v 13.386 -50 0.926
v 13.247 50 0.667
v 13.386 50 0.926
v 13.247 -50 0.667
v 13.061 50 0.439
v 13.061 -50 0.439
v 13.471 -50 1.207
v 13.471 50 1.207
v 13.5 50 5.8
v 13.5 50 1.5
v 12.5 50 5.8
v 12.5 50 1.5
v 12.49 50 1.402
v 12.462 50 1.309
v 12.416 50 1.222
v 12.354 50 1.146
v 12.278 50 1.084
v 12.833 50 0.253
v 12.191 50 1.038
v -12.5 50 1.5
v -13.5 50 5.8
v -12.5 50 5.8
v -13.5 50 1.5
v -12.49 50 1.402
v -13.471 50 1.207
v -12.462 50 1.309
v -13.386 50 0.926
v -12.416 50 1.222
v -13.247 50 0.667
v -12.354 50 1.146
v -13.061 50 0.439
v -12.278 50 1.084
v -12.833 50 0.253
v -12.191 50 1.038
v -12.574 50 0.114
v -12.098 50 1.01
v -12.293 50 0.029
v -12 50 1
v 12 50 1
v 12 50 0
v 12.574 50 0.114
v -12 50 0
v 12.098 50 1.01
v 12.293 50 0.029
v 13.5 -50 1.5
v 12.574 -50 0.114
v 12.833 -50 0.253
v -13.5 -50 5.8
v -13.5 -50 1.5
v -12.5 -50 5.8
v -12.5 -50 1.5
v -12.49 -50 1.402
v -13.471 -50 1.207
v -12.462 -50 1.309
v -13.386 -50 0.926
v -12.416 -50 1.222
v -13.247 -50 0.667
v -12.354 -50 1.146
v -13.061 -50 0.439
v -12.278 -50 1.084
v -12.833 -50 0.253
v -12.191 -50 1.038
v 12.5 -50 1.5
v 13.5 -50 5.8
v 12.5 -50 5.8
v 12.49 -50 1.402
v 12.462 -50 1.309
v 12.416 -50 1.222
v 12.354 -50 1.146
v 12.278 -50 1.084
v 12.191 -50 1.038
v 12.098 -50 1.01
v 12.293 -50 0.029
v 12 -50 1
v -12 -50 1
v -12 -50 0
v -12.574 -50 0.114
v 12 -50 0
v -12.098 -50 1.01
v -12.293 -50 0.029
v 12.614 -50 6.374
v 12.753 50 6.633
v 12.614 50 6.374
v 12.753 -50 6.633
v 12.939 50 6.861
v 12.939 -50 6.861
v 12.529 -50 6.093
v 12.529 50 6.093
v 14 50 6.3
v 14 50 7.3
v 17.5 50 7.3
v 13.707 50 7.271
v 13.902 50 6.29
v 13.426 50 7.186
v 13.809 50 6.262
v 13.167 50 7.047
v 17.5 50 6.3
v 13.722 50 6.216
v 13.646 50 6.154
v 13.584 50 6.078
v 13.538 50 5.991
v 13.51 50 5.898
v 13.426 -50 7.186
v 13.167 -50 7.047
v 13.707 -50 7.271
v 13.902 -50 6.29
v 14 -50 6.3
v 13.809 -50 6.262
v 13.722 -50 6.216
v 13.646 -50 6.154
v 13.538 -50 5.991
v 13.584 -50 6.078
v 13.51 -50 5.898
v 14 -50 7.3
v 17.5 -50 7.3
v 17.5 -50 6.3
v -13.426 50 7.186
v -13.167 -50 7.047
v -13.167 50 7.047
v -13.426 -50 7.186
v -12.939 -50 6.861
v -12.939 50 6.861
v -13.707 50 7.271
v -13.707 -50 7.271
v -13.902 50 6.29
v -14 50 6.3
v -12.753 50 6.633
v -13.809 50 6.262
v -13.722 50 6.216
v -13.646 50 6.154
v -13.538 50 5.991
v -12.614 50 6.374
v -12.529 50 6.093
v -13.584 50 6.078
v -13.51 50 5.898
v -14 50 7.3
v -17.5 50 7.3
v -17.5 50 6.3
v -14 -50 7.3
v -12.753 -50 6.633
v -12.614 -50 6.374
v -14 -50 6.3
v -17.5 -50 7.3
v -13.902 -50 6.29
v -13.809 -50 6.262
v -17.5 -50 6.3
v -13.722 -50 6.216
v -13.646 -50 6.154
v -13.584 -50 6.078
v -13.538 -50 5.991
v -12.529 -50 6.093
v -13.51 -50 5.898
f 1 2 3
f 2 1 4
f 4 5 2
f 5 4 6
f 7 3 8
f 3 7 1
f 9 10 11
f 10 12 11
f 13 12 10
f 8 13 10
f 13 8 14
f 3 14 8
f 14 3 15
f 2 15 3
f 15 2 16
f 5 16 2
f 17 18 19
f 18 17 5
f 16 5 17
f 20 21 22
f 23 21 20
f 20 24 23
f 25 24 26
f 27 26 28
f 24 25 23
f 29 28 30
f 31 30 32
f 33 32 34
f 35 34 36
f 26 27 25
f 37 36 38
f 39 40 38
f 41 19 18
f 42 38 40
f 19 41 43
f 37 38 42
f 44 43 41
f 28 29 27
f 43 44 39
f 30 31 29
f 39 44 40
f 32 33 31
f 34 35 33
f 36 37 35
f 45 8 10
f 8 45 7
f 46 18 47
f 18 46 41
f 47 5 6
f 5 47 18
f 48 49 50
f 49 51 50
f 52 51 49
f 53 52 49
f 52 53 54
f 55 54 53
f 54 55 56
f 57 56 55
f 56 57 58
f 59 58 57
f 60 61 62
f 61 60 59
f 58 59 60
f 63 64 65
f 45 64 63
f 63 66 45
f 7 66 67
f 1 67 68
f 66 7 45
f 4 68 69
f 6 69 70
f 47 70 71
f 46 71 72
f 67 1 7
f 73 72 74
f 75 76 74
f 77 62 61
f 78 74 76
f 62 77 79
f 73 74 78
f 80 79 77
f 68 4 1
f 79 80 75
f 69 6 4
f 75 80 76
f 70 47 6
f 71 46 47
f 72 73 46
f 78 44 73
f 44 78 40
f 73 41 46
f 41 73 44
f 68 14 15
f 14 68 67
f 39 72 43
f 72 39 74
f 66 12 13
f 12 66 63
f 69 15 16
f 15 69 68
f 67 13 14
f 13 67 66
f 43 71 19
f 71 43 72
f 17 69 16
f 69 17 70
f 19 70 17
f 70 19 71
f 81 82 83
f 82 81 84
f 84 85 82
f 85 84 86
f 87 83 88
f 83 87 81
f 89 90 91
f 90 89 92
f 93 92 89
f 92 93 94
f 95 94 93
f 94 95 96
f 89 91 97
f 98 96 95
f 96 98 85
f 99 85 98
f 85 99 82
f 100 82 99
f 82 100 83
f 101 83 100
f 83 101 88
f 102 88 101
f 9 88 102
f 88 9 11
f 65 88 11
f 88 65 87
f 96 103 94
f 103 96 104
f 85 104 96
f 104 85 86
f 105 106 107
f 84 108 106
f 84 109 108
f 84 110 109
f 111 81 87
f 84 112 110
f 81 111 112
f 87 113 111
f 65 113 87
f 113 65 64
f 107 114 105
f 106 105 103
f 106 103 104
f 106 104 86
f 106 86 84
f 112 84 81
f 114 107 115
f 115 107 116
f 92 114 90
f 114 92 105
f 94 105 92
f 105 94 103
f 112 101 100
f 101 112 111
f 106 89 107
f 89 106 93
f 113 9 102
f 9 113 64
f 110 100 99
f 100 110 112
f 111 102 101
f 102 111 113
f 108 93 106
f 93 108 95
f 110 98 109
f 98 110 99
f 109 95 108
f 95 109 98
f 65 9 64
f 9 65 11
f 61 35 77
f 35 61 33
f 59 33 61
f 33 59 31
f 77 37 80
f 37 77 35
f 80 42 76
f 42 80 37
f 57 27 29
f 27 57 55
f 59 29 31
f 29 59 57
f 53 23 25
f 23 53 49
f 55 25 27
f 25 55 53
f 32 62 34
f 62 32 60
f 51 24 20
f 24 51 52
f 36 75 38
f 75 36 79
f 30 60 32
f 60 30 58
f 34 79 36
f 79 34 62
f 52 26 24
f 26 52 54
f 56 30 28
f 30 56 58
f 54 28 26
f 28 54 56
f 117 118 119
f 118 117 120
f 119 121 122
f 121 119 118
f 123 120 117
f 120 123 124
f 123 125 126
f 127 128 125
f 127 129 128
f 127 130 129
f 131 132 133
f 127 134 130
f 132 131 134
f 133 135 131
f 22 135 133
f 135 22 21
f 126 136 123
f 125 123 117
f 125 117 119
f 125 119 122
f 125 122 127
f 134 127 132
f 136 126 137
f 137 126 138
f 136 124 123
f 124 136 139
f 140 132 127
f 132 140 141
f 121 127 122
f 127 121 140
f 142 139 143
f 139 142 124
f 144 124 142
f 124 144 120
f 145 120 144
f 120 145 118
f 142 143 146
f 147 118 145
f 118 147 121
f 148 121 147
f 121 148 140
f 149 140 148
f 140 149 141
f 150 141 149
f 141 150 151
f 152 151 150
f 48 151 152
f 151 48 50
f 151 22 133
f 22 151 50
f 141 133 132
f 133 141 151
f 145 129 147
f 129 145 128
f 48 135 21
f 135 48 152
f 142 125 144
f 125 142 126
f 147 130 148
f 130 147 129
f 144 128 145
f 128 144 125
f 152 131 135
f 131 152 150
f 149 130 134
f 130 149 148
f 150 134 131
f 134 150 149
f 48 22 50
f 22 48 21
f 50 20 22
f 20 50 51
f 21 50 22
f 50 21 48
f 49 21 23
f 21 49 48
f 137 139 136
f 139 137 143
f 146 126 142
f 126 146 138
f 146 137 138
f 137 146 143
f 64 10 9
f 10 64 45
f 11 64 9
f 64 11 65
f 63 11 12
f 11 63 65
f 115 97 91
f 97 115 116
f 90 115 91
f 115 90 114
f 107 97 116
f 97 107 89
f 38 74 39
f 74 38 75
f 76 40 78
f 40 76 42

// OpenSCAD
// file: linurs_body.scad
// linurs body
// body lets create mode advanced bodies as the standard ones from OpenSCAD as cube cylinder sphere and polyhedron

module prism(face=[[0,0],[1,0],[0,1]], h=1, center=false){  
  linear_extrude(height = h, center = center)
  polygon(points = [ face[0], face[1], face[2]], paths = [ [0, 1, 2]]);   
}
//prism();

module roundcube(size=[1,1,1], r=0.1, center=false, $fn=8){
  t = center==true ? 0 : 1; 
  translate([size[0]/2*t,size[1]/2*t,size[2]/2*t])
  union(){
    cube(size=[size[0],size[1]-2*r,size[2]-2*r],center=true);
    cube(size=[size[0]-2*r,size[1],size[2]-2*r],center=true);
    cube(size=[size[0]-2*r,size[1]-2*r,size[2]],center=true);

    for(x=[-size[0]/2+r,size[0]/2-r]){
      for(y=[-size[1]/2+r,size[1]/2-r]){
        translate([x,y,0])
          cylinder(r=r,h=size[2]-2*r, center=true,$fn=$fn);   
      }
    }

    for(x=[-size[0]/2+r,size[0]/2-r]){
      for(z=[-size[2]/2+r,size[2]/2-r]){
        translate([x,0,z])
          rotate([90,0,0])
          cylinder(r=r,h=size[1]-2*r, center=true,$fn=$fn);   
      }
    }


    for(y=[-size[1]/2+r,size[1]/2-r]){
      for(z=[-size[2]/2+r,size[2]/2-r]){
        translate([0,y,z])
          rotate([0,90,0])
          cylinder(r=r,h=size[0]-2*r, center=true,$fn=$fn);   
      }
    }

    for(x=[-size[0]/2+r,size[0]/2-r]){
      for(y=[-size[1]/2+r,size[1]/2-r]){
        for(z=[-size[2]/2+r,size[2]/2-r]){
          translate([x,y,z])
            sphere(r=r, center=true,$fn=$fn);   
        }
      }
    }
  }
}

module channel(d1=1,d2=3,h=10,a=90, center=false, $fn=32){
   intersection(){     
            difference(){
                cylinder(d=d2,h=h,center=true,$fn=$fn);
                cylinder(d=d1,h=2*h,center=true,$fn=$fn);      
            }
            if((a<180)&&(a>0)){
               t=0.5*d2*tan(a/2); 
               linear_extrude(height=2*h, center = true){
                   polygon(points=[
                                  [0,0],
                                  [d2/2,t],
                                  [d2/2,-t]
                                  ], paths=[[0,1,2]]);       
                }
            }    
            else if(a==180){
               translate([0,d2/2,0])cube([d2/2,d2,2*h]); 
            }    
   }
}

module springelement(x=0, y=0, t=1, s=2, x1=0, y1=0, a=0, l=10, m=0, e=0){
    h=1.5*s/tan(a);
    mirror([m,0,0])translate([-x,y,0]){
        rotate([0,0,180])channel(d1=2,
                d2=3*s,
                h=t,
                a=180-2*a);
        if(e==0){
                translate([x1,y1,-t/2])rotate([0,0,a])cube([l,s,t]);
        }        
    }
}    


module spring(s=2,d=[10,10,1],n=2){
//x center x
//y center y
//z tickness    
//s width of spring rods
    r1=s/2;
    r2=1.5*s;
    
    xi=d.x-3*s; // inner x circle center x
    yi=(d.y-3*s)/n/2;     // inner x circle center x
         
    c=sqrt(pow(xi,2)+pow(yi,2)); // distance between center
    c1=c/(1+r2/r1); // where spring rod cuts line between the two circle centers
    l1=sqrt(pow(c1,2)-pow(r1,2));    
    c2=c-c1;
    l2=sqrt(pow(c2,2)-pow(r2,2));
    l=l1+l2;
    a1=atan(yi/xi);
    a2=acos(r1/c1);
    a3=180-a2-a1;
    a4=90-a3;
    x1=-r1*cos(a3);
    y1=r1*sin(a3);
    
 
    translate([1.5*s,1.5*s,d.z/2]){
    for(i=[0:n-1]){
           springelement(x=0,y=i*yi*2,s=s,t=d.z, x1=x1, y1=y1, a=a4, l=l, m=0);        
    }
    for(i=[0:n-1]){
           springelement(x=xi,y=(2*i+1)*yi,s=s, t=d.z, x1=x1, y1=y1, a=a4, l=l, m=1);        
    }
    springelement(x=0,y=d.y-3*s,s=s,t=d.z, x1=x1, y1=y1, a=a4, l=l, m=0, e=1);
    }
    for(i=[0,1]){
      translate([0,i*d.y,0])mirror([0,i,0])difference(){
          cube([d.x,1.5*s,d.z]);
          translate([1.5*s,1.5*s,0])cylinder(d=s,h=3*d.z,center=true,$fn=32);
      } 
    }    
}



//
roundcube(size=[1,2,3],center=true, $fn=16);
//
translate([0,5,0])prism(h=10,center=true);
//
translate([0,10,0])channel();
//
translate([0,15,0]) spring(d=[10,30,4],n=2, s=2);
// file: dinrail_dim.scad
// din rail
dinrail_w1=35;
dinrail_w2=27;
dinrail_h=7.3;
dinrail_t=1;
dinrail_r=0.5; // inner bending radius
// main file
// din rail

include <dinrail_dim.scad>
use <linurs_body.scad>

module dinrail(l=100)
{   
  translate([0,0,dinrail_t/2])
    cube([dinrail_w2-2*dinrail_r-2*dinrail_t,
          l,
          dinrail_t],center=true);
          
  for(i=[-1,1]){
    translate([i*(dinrail_w2-dinrail_t)/2,
               0,
               dinrail_h/2])
      cube([dinrail_t,l,dinrail_h-2*dinrail_r-2*dinrail_t],
           center=true);  
      
    translate([i*(dinrail_w2/2+(dinrail_w1-dinrail_w2)/4+dinrail_r/2),
               0,
               dinrail_h-dinrail_t/2])
      cube([(dinrail_w1-dinrail_w2)/2-dinrail_r,l,dinrail_t],
           center=true);
      
    translate([i*(-dinrail_w2/2+dinrail_r+dinrail_t),
               0,
               dinrail_r+dinrail_t])
      rotate([90,90+i*45,0])  
      channel(d1=dinrail_r*2,d2=(dinrail_r+dinrail_t)*2,h=l,a=90);  
      
    translate([i*(-dinrail_w2/2-dinrail_r),
               0,
               dinrail_h-dinrail_r-dinrail_t])
      rotate([90,-90+i*45,0])  
      channel(d1=dinrail_r*2,d2=(dinrail_r+dinrail_t)*2,h=l,a=90);       
  }
}

dinrail();
